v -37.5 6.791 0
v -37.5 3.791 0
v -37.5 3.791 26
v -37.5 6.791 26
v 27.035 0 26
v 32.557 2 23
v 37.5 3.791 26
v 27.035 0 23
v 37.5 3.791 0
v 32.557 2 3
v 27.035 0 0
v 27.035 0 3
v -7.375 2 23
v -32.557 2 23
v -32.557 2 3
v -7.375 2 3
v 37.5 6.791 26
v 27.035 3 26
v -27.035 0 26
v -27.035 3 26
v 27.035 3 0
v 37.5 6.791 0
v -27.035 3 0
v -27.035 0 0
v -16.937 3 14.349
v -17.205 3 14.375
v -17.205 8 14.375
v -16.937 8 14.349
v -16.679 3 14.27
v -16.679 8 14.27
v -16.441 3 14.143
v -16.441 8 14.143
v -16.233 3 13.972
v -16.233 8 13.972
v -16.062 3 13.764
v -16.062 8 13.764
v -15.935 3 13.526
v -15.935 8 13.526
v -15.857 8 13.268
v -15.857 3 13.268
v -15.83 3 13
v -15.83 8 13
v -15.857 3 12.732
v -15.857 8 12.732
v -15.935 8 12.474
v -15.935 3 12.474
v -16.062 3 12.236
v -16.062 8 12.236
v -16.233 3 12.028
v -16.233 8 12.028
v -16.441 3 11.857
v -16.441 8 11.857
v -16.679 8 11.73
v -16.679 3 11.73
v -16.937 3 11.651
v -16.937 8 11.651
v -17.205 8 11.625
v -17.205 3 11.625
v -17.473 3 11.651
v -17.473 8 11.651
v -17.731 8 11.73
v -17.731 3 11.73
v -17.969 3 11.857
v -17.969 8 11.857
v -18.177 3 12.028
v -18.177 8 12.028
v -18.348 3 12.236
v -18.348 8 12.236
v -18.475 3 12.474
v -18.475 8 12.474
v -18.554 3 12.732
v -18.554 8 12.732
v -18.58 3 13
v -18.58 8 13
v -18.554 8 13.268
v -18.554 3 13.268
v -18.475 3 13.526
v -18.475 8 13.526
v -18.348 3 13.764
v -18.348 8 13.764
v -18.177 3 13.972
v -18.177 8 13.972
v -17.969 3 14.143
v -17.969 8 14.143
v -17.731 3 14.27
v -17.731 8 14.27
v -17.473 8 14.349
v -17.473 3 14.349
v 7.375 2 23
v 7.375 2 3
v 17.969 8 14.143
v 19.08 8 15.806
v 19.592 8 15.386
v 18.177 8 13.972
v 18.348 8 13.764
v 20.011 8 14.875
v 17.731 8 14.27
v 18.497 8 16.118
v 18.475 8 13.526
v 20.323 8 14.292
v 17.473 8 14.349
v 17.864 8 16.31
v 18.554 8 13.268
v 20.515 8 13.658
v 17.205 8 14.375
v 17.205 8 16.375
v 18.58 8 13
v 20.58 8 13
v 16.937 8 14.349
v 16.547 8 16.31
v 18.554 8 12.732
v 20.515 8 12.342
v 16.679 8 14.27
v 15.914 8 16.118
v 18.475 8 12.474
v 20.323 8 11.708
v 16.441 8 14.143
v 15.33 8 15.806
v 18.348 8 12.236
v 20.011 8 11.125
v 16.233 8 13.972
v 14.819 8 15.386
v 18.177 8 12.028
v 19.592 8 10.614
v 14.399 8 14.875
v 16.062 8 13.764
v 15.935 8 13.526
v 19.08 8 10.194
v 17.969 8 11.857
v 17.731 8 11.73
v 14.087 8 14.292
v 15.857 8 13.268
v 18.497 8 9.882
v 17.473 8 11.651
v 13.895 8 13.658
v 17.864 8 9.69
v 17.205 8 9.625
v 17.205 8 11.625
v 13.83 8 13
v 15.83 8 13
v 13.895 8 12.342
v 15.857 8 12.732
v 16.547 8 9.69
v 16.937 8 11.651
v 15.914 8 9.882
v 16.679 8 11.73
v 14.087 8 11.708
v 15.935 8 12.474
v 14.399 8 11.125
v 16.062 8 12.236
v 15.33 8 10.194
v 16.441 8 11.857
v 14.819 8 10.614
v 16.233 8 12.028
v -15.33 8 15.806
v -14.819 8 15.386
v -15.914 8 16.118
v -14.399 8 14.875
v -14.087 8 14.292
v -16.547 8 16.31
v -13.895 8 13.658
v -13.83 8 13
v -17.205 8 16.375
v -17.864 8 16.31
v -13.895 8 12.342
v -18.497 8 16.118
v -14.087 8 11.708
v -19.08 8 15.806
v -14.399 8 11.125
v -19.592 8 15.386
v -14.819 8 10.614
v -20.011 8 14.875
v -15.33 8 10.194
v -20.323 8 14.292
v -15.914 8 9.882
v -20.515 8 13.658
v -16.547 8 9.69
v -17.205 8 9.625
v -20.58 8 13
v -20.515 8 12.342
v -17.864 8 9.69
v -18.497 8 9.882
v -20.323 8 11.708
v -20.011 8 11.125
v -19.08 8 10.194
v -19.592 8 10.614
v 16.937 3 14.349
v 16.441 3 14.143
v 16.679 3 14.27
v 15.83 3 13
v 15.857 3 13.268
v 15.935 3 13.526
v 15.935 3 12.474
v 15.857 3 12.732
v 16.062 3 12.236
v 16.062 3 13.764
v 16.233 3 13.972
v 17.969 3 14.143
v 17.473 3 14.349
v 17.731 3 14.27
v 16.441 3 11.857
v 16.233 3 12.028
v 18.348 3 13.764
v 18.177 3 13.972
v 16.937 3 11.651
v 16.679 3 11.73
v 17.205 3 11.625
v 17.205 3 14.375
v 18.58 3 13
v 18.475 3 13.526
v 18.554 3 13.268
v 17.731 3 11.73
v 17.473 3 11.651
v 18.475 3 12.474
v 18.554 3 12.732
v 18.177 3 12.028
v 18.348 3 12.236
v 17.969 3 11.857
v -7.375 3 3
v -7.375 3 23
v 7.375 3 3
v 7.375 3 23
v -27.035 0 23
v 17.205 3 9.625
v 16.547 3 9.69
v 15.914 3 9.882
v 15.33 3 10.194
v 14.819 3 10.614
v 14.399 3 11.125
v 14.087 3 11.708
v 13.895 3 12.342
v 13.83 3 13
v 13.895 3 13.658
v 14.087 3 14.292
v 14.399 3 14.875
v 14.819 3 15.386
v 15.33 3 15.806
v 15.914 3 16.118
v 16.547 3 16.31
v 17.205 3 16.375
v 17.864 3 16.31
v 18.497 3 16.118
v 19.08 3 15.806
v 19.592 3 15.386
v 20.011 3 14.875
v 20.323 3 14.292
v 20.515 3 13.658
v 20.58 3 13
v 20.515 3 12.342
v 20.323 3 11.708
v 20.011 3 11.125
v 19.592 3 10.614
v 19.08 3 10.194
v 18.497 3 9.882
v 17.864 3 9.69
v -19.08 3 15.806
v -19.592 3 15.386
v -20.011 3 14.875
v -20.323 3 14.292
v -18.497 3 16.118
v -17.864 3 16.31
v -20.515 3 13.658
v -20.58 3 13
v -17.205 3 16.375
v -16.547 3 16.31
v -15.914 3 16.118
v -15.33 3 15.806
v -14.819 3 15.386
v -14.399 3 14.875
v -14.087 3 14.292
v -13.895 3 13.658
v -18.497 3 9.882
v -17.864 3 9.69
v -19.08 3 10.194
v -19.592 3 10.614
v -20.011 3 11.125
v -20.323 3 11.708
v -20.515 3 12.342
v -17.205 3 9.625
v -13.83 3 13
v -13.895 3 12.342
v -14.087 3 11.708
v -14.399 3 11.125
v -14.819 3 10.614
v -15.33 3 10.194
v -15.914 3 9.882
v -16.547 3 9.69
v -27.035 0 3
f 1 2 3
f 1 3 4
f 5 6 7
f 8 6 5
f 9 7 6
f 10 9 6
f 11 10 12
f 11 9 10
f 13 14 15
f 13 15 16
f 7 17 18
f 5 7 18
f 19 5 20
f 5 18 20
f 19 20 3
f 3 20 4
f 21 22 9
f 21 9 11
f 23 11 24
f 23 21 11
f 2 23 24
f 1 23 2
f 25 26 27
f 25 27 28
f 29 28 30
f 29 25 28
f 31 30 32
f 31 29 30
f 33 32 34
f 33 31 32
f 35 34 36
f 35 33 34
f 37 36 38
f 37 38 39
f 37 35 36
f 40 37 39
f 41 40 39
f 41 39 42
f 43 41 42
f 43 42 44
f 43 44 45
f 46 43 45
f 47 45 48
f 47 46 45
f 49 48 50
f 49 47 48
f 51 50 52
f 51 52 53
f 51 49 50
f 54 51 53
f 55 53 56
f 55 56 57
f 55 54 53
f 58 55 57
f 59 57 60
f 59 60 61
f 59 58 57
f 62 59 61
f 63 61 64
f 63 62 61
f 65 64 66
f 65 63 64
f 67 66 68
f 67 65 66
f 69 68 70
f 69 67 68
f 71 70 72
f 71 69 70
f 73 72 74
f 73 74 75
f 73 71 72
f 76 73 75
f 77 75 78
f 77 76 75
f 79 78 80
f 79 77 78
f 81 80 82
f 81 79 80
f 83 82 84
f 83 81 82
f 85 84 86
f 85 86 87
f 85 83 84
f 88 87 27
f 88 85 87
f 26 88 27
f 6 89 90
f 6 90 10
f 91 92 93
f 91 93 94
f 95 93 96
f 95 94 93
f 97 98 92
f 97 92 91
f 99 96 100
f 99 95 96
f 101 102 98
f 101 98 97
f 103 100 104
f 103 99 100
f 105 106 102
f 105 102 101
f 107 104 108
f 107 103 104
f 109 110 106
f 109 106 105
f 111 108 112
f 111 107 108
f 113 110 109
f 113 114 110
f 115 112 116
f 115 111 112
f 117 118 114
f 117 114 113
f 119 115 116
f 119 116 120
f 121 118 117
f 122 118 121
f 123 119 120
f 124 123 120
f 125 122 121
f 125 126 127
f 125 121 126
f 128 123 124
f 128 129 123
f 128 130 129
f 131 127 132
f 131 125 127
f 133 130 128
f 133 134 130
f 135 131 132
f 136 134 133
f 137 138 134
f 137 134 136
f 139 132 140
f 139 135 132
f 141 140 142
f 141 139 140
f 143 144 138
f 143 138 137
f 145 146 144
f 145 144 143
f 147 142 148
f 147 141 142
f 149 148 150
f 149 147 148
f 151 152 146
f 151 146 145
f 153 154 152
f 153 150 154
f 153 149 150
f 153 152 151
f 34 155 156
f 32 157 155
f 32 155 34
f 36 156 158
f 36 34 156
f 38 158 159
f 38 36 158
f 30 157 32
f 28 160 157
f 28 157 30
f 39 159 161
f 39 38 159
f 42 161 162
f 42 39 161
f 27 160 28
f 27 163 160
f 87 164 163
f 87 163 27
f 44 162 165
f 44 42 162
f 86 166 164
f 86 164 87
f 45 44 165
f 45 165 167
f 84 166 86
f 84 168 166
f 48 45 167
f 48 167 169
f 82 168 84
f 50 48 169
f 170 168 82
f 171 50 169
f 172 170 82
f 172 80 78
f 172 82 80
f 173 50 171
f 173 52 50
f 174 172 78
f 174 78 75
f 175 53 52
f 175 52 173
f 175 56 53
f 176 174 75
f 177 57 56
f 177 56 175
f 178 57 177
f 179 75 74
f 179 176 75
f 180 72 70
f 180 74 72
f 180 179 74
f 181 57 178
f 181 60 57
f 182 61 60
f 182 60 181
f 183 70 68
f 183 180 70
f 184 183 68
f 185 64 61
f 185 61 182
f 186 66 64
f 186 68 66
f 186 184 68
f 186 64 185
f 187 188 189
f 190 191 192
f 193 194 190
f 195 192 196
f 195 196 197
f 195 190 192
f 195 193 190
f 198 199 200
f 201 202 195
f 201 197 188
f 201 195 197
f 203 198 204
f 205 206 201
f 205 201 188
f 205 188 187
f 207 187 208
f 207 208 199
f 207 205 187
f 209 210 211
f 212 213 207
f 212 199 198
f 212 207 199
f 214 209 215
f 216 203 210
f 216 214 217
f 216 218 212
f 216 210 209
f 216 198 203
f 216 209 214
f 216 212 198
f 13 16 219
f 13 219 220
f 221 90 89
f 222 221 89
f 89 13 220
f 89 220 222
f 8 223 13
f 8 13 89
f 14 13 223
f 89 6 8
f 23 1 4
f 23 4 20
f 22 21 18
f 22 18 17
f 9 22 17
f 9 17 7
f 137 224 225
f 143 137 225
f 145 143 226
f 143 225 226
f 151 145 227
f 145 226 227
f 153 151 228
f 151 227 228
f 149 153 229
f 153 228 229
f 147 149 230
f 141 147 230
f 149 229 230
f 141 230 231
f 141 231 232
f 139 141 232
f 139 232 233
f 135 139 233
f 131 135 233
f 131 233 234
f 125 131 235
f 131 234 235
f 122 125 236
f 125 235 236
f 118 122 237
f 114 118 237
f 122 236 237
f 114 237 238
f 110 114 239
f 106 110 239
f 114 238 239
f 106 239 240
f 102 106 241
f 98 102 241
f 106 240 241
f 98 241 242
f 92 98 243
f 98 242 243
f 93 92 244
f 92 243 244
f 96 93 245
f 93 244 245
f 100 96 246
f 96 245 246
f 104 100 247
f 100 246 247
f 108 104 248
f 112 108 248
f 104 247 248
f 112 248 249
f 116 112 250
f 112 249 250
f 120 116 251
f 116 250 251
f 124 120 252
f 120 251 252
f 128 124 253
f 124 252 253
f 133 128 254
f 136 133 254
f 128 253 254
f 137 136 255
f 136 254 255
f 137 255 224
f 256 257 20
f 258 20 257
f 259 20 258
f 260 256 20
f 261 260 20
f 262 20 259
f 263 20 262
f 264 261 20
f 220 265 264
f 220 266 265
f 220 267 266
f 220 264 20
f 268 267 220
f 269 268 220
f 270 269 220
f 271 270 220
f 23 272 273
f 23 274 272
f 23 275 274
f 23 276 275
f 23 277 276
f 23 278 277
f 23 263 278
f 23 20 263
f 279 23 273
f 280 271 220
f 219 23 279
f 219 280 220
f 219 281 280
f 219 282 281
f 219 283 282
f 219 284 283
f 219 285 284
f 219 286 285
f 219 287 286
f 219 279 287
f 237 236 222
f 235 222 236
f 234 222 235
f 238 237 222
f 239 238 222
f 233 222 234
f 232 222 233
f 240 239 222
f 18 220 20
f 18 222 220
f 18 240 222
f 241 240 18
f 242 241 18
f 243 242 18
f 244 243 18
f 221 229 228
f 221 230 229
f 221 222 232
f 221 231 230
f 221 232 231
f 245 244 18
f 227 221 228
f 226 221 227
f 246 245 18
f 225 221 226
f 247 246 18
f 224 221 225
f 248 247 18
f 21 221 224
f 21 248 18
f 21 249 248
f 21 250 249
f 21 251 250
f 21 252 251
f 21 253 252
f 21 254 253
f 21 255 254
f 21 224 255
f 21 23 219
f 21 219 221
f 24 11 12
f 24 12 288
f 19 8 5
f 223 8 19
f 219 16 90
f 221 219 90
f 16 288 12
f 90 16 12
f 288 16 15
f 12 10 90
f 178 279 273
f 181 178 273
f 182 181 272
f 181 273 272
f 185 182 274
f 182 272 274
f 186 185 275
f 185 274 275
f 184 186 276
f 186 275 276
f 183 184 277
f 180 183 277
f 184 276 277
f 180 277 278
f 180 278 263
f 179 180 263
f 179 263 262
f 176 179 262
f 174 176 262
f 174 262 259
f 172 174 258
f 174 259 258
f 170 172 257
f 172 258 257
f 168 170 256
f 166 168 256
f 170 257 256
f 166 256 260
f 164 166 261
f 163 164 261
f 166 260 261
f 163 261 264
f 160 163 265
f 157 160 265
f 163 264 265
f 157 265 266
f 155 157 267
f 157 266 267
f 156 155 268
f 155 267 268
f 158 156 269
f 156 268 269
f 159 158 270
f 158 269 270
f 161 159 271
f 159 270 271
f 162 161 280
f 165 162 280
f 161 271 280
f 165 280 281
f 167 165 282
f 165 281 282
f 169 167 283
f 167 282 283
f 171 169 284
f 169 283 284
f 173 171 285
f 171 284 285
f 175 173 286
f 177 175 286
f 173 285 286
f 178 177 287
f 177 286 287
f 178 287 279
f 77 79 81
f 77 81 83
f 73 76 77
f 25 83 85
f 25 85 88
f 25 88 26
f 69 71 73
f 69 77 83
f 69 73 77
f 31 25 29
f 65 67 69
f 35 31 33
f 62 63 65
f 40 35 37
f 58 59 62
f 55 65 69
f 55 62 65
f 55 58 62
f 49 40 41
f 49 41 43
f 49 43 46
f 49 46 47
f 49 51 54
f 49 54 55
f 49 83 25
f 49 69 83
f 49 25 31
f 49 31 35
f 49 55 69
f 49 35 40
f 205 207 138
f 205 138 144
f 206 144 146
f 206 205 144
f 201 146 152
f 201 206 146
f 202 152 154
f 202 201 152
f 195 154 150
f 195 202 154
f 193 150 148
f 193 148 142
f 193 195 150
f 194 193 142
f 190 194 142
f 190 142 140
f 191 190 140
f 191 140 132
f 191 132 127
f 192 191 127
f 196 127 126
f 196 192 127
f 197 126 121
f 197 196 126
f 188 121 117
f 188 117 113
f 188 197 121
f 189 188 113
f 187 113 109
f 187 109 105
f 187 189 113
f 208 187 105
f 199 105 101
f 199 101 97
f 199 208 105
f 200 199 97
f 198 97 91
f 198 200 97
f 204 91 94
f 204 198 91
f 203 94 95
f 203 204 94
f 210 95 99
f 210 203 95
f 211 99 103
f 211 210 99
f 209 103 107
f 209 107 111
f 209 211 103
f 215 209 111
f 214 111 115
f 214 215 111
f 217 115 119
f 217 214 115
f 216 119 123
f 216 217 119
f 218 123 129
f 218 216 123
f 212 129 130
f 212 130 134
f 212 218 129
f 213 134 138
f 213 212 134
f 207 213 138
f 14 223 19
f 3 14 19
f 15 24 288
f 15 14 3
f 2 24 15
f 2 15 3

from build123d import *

# Parameters (mm, degrees)
BOSS_EXTRUDE1_DEPTH = 26
SKETCH2_W           = 75
SKETCH2_H           = 20
CUT_EXTRUDE1_DEPTH  = 1
SKETCH4_W           = 75
SKETCH4_H           = 20
CUT_EXTRUDE2_DEPTH  = 1
SKETCH5_W           = 14.75
SKETCH5_H           = 20
CUT_EXTRUDE3_DEPTH  = 46.882459228
SKETCH6_R           = 3.375
SKETCH6_R_2         = 1.375
BOSS_EXTRUDE2_DEPTH = 5


with BuildPart() as part:
    # Sketch1 → Boss-Extrude1 (new body)
    with BuildSketch(Plane.XY):
        Polygon((27.035253752, 0), (-27.035253752, 0), (-37.5, 3.790622591), (-37.5, 6.790622591), (-27.035253752, 3), (27.035253752, 3), (37.5, 6.790622591), (37.5, 3.790622591), align=None)
    extrude(amount=BOSS_EXTRUDE1_DEPTH)

    # Sketch2 → Cut-Extrude1 (cut)
    with BuildSketch(Plane.XZ):
        with Locations((0, 13)):
            Rectangle(SKETCH2_W, SKETCH2_H)
    extrude(amount=-CUT_EXTRUDE1_DEPTH, mode=Mode.SUBTRACT)

    # Sketch4 → Cut-Extrude2 (cut)
    with BuildSketch(Plane.XZ.offset(-1)):
        with Locations((0, 13)):
            Rectangle(SKETCH4_W, SKETCH4_H)
    extrude(amount=-CUT_EXTRUDE2_DEPTH, mode=Mode.SUBTRACT)

    # Sketch5 → Cut-Extrude3 (cut, through all)
    with BuildSketch(Plane.XZ.offset(-2)):
        with Locations((0, 13)):
            Rectangle(SKETCH5_W, SKETCH5_H)
    extrude(amount=-CUT_EXTRUDE3_DEPTH, mode=Mode.SUBTRACT)

    # Sketch6 → Boss-Extrude2 (add)
    # profile 1 of 2: a face of its own
    with BuildSketch(Plane(origin=(0, 3, 0), x_dir=(1, 0, 0), z_dir=(0, 1, 0))):
        with Locations(Location((-17.205126876, -13, 0), (0, 0, 90))):
            Circle(SKETCH6_R)
        with Locations(Location((-17.205126876, -13, 0), (0, 0, 270))):
            Circle(SKETCH6_R_2, mode=Mode.SUBTRACT)
    # profile 2 of 2: a face of its own
    with BuildSketch(Plane(origin=(0, 3, 0), x_dir=(1, 0, 0), z_dir=(0, 1, 0))):
        with Locations(Location((17.205126876, -13, 0), (0, 0, 90))):
            Circle(SKETCH6_R)
        with Locations(Location((17.205126876, -13, 0), (0, 0, 90))):
            Circle(SKETCH6_R_2, mode=Mode.SUBTRACT)
    extrude(amount=BOSS_EXTRUDE2_DEPTH)


solid = part.part
